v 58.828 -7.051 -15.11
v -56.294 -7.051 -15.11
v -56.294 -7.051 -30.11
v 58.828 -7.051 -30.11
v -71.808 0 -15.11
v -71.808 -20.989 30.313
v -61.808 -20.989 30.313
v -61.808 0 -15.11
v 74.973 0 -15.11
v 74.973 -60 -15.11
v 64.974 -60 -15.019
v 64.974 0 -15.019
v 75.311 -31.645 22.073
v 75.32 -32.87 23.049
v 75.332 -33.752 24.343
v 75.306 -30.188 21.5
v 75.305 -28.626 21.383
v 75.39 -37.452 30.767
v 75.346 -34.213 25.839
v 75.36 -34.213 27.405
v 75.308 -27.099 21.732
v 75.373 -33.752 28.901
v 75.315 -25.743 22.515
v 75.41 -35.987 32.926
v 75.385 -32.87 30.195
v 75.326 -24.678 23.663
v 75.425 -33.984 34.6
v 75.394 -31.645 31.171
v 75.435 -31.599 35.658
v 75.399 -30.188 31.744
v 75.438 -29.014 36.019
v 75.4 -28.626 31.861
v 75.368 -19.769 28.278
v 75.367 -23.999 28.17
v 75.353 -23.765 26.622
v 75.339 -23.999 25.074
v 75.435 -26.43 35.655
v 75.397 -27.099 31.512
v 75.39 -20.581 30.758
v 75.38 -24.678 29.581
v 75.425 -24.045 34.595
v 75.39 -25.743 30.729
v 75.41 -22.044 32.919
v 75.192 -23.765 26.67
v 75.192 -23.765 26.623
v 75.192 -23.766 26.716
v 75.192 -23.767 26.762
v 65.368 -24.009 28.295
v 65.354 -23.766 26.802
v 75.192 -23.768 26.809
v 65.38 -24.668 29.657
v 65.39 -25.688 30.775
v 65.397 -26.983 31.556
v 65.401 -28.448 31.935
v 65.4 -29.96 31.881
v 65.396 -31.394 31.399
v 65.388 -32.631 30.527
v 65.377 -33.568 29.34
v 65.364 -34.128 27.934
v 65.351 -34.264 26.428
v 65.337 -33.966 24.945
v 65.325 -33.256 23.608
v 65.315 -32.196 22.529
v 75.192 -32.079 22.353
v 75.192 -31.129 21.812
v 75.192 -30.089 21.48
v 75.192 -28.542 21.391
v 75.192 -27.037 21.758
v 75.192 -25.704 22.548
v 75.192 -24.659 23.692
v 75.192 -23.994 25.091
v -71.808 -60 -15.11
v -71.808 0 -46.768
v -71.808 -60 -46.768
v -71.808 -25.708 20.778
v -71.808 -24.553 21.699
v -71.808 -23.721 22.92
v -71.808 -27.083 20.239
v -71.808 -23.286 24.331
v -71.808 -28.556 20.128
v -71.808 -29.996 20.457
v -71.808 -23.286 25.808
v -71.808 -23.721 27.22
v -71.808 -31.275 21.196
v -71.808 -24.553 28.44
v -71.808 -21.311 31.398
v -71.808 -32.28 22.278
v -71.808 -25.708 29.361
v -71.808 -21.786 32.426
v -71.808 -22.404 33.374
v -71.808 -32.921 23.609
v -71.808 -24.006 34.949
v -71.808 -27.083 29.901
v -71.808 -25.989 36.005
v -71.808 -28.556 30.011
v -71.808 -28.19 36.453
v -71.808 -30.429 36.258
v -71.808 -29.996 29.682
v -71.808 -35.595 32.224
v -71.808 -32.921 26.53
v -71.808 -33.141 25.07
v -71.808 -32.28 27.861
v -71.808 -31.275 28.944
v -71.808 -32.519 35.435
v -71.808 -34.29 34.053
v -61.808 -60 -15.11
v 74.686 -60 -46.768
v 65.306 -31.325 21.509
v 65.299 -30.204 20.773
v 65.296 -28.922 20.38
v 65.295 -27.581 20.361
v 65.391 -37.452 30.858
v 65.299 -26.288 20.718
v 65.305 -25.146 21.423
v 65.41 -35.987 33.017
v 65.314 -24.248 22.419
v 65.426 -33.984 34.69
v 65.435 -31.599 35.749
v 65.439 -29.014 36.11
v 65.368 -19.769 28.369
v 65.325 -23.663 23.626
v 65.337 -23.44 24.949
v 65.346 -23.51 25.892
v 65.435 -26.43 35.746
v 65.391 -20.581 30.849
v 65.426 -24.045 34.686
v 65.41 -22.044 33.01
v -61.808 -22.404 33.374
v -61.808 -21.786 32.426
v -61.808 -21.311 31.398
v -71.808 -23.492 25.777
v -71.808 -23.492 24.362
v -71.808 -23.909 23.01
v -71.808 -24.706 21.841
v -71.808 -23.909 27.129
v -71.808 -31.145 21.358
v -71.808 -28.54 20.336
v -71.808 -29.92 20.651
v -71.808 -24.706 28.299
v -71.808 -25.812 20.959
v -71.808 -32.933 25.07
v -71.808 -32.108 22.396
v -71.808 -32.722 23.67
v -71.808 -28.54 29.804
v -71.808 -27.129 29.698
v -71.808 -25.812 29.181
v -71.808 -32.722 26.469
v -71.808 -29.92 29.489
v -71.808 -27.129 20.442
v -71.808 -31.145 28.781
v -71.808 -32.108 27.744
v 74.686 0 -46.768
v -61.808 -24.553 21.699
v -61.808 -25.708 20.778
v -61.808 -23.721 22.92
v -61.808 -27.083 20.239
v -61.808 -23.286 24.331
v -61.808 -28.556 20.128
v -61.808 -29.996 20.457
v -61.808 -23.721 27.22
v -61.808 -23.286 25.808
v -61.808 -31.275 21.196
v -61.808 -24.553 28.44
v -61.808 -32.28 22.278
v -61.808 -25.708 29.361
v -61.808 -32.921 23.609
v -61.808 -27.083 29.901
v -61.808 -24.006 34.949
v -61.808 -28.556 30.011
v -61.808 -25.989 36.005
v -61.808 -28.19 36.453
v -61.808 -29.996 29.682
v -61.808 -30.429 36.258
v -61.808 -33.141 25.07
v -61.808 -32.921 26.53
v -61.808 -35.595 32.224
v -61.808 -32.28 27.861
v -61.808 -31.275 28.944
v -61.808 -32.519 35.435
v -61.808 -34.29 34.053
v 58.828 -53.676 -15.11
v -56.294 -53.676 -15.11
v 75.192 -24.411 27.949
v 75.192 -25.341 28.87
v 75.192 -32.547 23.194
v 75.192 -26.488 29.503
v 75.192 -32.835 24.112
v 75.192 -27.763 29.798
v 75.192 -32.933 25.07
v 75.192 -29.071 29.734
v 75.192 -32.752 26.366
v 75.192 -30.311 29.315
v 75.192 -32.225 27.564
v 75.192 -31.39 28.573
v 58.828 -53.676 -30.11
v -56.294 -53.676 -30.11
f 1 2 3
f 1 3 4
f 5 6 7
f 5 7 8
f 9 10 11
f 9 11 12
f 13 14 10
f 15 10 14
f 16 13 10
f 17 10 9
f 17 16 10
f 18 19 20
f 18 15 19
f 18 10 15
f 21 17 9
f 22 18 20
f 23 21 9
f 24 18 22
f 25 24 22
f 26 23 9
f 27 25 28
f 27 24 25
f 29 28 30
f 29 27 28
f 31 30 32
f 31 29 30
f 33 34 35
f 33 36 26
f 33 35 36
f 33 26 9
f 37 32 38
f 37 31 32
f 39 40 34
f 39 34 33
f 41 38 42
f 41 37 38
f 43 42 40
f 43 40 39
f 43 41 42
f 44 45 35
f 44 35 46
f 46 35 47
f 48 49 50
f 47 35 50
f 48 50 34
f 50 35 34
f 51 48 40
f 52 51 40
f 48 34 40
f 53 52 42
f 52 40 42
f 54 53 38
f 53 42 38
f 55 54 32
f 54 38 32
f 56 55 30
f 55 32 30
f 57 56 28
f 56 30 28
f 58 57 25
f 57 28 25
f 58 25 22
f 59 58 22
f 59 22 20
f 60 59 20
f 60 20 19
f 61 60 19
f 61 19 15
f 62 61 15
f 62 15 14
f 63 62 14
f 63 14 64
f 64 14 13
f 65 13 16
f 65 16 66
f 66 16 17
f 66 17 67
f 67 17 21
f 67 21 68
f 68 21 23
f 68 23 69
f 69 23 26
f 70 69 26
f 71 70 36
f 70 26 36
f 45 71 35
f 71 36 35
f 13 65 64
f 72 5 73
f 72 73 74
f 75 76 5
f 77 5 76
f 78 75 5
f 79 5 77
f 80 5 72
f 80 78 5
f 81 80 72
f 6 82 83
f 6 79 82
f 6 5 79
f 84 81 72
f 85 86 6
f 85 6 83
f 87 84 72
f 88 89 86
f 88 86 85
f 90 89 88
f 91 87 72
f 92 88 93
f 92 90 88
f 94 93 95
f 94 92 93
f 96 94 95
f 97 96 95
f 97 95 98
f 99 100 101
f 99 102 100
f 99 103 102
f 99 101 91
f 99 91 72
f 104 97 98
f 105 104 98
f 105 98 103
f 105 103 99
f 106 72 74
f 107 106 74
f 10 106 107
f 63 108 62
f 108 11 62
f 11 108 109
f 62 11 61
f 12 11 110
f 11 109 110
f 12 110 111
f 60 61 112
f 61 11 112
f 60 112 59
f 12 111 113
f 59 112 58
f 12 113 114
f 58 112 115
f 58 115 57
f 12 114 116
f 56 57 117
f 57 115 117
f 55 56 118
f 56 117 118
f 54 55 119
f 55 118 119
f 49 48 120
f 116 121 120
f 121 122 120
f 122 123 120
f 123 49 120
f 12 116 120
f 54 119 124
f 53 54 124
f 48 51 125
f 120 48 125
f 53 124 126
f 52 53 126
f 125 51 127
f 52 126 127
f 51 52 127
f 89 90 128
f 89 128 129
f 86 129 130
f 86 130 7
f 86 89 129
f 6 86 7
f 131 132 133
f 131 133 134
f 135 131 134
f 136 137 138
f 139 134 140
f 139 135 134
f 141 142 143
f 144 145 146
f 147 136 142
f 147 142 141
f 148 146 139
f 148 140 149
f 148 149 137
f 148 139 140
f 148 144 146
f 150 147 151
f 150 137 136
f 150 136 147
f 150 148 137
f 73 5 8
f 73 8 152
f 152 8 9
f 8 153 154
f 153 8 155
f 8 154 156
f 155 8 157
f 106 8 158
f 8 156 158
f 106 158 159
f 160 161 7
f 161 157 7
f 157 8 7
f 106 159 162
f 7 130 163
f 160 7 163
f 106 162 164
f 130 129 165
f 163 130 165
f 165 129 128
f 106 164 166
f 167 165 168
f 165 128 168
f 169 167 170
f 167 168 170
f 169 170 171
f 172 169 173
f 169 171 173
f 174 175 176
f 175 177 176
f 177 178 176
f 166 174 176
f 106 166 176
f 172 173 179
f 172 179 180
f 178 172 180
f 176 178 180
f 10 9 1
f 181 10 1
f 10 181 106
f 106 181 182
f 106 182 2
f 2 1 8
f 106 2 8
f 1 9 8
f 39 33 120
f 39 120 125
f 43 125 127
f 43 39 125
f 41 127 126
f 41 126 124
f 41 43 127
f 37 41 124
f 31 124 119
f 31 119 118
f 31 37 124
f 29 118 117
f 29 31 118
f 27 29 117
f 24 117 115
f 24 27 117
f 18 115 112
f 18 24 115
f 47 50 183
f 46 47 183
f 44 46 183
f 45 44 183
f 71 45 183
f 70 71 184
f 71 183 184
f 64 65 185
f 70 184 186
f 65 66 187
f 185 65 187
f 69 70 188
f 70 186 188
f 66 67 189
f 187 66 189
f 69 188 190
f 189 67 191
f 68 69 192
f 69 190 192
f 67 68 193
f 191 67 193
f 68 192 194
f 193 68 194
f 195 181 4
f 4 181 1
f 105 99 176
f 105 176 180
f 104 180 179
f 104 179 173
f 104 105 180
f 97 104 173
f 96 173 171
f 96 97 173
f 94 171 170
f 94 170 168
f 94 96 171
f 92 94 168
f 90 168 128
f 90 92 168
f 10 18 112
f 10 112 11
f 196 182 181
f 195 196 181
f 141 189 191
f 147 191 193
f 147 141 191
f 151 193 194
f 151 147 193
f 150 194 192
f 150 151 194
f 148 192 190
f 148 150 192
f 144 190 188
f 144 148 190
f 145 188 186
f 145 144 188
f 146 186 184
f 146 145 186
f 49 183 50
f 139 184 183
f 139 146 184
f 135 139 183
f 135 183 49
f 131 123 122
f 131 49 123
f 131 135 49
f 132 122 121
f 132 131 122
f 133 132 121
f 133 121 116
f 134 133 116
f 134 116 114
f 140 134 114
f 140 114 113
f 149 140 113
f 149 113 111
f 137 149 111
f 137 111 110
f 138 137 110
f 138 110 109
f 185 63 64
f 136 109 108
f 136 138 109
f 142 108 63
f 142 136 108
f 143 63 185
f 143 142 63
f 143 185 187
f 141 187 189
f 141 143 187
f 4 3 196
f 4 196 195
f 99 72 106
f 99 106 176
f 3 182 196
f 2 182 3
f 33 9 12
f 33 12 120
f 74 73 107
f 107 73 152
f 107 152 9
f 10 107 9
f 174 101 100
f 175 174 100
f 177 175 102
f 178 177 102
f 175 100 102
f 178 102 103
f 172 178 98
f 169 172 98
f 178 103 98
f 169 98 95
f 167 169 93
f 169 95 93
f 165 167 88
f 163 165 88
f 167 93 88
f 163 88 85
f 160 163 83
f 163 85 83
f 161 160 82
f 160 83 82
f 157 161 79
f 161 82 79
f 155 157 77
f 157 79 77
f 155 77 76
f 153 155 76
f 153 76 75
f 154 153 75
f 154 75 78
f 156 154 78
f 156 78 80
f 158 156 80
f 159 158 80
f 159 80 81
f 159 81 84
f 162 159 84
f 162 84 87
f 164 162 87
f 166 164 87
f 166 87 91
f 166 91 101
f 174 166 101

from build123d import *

# Parameters (mm, degrees)
F1_DEPTH  = 60
F3_DEPTH  = 10
F5_DEPTH  = 10
F6_W      = 115.122299
F6_H      = 46.624533
F7_DEPTH  = 15
F8_R      = 4.955258
F9_DEPTH  = 25
F10_R     = 5.253473
F11_DEPTH = 25
F12_R     = 4.747147
F13_DEPTH = 147


with BuildPart() as f1:
    # F0 (on Front) → F1 (new body)
    with BuildSketch(Plane.XZ):
        Polygon((74.685596, -46.768438), (74.973397, -15.109803), (-71.807534, -15.109803), (-71.807534, -46.768438), align=None)
    extrude(amount=F1_DEPTH)

    # F2 (on face) → F3 (join)
    with BuildSketch(Plane(origin=(-71.807534, 0, 0), x_dir=(0, -1, 0), z_dir=(-1, 0, 0))):
        with BuildLine():
            ThreePointArc((20.989064, 30.312963), (27.793625, 20.853029), (36.465838, 28.636673))
            ThreePointArc((36.465838, 28.636673), (36.245114, 30.482603), (35.595386, 32.22445))
            ThreePointArc((35.595386, 32.22445), (29.316557, 36.436263), (22.403684, 33.374364))
            Line((22.403684, 33.374364), (20.989064, 30.312963))
        make_face()
        with BuildLine():
            ThreePointArc((35.595386, 32.22445), (36.245114, 30.482603), (36.465838, 28.636673))
            ThreePointArc((36.465838, 28.636673), (27.793625, 20.853029), (20.989064, 30.312963))
            Line((20.989064, 30.312963), (0, -15.109803))
            Line((0, -15.109803), (60, -15.109803))
            Line((60, -15.109803), (35.595386, 32.22445))
        make_face()
        with BuildLine():
            ThreePointArc((22.403684, 33.374364), (21.529578, 31.920737), (20.989064, 30.312963))
            Line((20.989064, 30.312963), (22.403684, 33.374364))
        make_face()
    extrude(amount=-F3_DEPTH)

    # F6 (on face) → F7 (cut)
    with BuildSketch(Plane.XY.offset(-15.109803)):
        with Locations((1.266939, -30.363507)):
            Rectangle(F6_W, F6_H)
    extrude(amount=-F7_DEPTH, mode=Mode.SUBTRACT)

    # F8 (on face) → F9 (cut)
    with BuildSketch(Plane(origin=(-71.807534, 0, 0), x_dir=(0, -1, 0), z_dir=(-1, 0, 0))):
        with Locations((28.185701, 25.069697)):
            Circle(F8_R)
    extrude(amount=-F9_DEPTH, mode=Mode.SUBTRACT)


with BuildPart() as f5:
    # F4 (on face) → F5 (new body)
    with BuildSketch(Plane(origin=(75.10455, 0, -0.682757), x_dir=(0, 1, 0), z_dir=(0.999959, 0, -0.00909))):
        with BuildLine():
            ThreePointArc((-37.452274, 31.450747), (-31.146363, 18.15289), (-19.621624, 27.305918))
            ThreePointArc((-19.621624, 27.305918), (-19.658479, 28.137359), (-19.768754, 28.962278))
            ThreePointArc((-19.768754, 28.962278), (-27.709216, 36.611302), (-37.452274, 31.450747))
        make_face()
        with BuildLine():
            ThreePointArc((-19.768754, 28.962278), (-19.658479, 28.137359), (-19.621624, 27.305918))
            ThreePointArc((-19.621624, 27.305918), (-31.146363, 18.15289), (-37.452274, 31.450747))
            Line((-37.452274, 31.450747), (-60, -14.427641))
            Line((-60, -14.427641), (0, -14.427641))
            Line((0, -14.427641), (-19.768754, 28.962278))
        make_face()
    extrude(amount=-F5_DEPTH)

    # F10 (on face) → F11 (cut)
    with BuildSketch(Plane(origin=(75.10455, 0, -0.682757), x_dir=(0, 1, 0), z_dir=(0.999959, 0, -0.00909))):
        with Locations((-29.018693, 27.305918)):
            Circle(F10_R)
    extrude(amount=-F11_DEPTH, mode=Mode.SUBTRACT)

    # F12 (on face) → F13 (join)
    with BuildSketch(Plane(origin=(-71.807534, 0, 0), x_dir=(0, -1, 0), z_dir=(-1, 0, 0))):
        with Locations((28.185701, 25.069697)):
            Circle(F12_R)
    extrude(amount=-F13_DEPTH)


solid = Compound([f1.part, f5.part])
